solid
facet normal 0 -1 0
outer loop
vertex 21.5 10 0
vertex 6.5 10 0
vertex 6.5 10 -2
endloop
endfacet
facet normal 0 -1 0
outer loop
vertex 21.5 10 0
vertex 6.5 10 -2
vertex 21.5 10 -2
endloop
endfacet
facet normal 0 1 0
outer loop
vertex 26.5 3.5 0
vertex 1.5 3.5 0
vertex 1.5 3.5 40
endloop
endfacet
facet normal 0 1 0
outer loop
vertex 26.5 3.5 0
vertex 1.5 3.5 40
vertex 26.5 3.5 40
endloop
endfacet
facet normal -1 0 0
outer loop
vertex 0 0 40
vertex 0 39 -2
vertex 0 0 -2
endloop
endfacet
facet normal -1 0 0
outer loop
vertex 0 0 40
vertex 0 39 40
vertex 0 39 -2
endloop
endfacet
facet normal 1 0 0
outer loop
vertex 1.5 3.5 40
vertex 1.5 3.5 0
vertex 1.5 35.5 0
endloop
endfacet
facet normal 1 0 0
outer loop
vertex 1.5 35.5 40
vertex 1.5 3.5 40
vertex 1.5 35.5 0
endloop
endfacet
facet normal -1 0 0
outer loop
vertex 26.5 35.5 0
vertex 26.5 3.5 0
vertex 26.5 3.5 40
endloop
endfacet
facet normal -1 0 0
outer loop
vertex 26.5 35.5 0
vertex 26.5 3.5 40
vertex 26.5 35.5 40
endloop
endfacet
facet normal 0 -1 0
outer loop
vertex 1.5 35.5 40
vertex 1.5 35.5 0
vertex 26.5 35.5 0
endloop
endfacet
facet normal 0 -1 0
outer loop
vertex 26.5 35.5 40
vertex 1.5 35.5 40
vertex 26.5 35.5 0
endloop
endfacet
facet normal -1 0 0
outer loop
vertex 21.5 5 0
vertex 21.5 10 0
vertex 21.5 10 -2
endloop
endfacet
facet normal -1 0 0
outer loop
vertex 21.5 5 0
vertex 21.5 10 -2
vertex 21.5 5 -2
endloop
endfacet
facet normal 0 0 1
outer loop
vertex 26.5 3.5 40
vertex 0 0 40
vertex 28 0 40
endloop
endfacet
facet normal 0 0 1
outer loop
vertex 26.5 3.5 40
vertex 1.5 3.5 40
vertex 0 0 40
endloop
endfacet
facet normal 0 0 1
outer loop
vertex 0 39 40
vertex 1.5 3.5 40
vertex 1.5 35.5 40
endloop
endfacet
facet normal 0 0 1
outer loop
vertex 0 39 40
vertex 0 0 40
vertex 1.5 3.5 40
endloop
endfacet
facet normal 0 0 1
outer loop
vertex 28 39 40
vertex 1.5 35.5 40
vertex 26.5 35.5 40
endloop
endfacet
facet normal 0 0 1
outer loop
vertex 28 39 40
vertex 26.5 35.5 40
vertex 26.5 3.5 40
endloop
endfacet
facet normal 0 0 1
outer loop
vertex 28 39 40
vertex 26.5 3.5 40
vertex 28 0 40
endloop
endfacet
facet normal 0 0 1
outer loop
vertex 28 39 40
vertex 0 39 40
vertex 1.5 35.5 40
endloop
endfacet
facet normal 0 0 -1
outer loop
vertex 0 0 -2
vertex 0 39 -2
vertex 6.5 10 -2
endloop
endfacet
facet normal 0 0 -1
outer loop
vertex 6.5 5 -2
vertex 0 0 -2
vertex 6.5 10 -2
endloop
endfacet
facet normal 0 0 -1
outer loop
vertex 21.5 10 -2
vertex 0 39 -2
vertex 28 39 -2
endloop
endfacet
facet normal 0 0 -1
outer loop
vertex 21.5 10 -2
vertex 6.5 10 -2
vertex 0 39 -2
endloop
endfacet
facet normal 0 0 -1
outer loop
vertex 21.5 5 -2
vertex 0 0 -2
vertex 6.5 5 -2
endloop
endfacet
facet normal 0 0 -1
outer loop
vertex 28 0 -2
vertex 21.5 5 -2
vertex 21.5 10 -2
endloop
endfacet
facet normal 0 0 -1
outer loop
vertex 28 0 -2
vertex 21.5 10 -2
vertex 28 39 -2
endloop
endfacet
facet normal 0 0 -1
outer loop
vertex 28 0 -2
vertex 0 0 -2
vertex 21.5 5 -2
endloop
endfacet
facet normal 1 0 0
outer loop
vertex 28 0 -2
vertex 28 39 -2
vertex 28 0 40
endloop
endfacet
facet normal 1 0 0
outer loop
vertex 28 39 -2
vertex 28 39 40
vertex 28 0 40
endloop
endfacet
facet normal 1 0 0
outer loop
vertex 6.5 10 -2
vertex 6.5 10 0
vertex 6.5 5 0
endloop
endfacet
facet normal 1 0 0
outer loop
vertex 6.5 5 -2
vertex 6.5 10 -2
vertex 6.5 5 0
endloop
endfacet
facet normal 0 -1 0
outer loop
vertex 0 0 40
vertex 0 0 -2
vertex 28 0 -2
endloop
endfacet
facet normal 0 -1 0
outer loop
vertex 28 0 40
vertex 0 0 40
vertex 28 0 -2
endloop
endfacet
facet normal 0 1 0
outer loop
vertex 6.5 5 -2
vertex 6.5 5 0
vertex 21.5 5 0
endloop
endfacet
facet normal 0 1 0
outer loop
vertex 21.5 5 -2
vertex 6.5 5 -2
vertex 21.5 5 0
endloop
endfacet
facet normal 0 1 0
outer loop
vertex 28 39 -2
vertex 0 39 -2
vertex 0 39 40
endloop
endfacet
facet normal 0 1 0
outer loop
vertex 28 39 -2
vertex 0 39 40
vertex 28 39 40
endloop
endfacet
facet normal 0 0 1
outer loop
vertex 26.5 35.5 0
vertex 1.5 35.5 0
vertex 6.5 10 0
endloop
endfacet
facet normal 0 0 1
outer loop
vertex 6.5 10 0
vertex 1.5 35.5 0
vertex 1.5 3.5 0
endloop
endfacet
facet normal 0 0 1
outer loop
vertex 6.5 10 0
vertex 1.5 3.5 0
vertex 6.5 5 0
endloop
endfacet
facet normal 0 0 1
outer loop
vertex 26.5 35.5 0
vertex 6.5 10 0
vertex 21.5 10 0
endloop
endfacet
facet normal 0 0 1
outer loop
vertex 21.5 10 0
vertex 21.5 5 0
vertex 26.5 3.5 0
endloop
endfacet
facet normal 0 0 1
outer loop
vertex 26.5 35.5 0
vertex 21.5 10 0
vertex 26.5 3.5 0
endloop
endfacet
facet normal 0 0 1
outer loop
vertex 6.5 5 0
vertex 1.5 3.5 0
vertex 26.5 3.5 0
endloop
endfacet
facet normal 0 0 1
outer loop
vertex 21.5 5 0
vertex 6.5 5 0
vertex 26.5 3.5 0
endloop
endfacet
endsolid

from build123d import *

# Parameters (mm, degrees)
SKETCH_W      = 28
SKETCH_H      = 39
SKETCH_W_2    = 25
SKETCH_H_2    = 32
PAD_DEPTH     = 40
SKETCH001_W   = 28
SKETCH001_H   = 39
SKETCH001_W_2 = 15
SKETCH001_H_2 = 5
PAD001_DEPTH  = 2


with BuildPart() as part:
    # Sketch → Pad (new body)
    with BuildSketch(Plane.XY):
        with Locations((14, 19.5)):
            Rectangle(SKETCH_W, SKETCH_H)
        with Locations((14, 19.5)):
            Rectangle(SKETCH_W_2, SKETCH_H_2, mode=Mode.SUBTRACT)
    extrude(amount=PAD_DEPTH)

    # Sketch001 (on Face9 of Pad) → Pad001 (join)
    with BuildSketch(Plane(origin=(0, 0, 0), x_dir=(1, 0, 0), z_dir=(0, 0, -1))):
        with Locations((14, -19.5)):
            Rectangle(SKETCH001_W, SKETCH001_H)
        with Locations((14, -7.5)):
            Rectangle(SKETCH001_W_2, SKETCH001_H_2, mode=Mode.SUBTRACT)
    extrude(amount=PAD001_DEPTH)


solid = part.part
